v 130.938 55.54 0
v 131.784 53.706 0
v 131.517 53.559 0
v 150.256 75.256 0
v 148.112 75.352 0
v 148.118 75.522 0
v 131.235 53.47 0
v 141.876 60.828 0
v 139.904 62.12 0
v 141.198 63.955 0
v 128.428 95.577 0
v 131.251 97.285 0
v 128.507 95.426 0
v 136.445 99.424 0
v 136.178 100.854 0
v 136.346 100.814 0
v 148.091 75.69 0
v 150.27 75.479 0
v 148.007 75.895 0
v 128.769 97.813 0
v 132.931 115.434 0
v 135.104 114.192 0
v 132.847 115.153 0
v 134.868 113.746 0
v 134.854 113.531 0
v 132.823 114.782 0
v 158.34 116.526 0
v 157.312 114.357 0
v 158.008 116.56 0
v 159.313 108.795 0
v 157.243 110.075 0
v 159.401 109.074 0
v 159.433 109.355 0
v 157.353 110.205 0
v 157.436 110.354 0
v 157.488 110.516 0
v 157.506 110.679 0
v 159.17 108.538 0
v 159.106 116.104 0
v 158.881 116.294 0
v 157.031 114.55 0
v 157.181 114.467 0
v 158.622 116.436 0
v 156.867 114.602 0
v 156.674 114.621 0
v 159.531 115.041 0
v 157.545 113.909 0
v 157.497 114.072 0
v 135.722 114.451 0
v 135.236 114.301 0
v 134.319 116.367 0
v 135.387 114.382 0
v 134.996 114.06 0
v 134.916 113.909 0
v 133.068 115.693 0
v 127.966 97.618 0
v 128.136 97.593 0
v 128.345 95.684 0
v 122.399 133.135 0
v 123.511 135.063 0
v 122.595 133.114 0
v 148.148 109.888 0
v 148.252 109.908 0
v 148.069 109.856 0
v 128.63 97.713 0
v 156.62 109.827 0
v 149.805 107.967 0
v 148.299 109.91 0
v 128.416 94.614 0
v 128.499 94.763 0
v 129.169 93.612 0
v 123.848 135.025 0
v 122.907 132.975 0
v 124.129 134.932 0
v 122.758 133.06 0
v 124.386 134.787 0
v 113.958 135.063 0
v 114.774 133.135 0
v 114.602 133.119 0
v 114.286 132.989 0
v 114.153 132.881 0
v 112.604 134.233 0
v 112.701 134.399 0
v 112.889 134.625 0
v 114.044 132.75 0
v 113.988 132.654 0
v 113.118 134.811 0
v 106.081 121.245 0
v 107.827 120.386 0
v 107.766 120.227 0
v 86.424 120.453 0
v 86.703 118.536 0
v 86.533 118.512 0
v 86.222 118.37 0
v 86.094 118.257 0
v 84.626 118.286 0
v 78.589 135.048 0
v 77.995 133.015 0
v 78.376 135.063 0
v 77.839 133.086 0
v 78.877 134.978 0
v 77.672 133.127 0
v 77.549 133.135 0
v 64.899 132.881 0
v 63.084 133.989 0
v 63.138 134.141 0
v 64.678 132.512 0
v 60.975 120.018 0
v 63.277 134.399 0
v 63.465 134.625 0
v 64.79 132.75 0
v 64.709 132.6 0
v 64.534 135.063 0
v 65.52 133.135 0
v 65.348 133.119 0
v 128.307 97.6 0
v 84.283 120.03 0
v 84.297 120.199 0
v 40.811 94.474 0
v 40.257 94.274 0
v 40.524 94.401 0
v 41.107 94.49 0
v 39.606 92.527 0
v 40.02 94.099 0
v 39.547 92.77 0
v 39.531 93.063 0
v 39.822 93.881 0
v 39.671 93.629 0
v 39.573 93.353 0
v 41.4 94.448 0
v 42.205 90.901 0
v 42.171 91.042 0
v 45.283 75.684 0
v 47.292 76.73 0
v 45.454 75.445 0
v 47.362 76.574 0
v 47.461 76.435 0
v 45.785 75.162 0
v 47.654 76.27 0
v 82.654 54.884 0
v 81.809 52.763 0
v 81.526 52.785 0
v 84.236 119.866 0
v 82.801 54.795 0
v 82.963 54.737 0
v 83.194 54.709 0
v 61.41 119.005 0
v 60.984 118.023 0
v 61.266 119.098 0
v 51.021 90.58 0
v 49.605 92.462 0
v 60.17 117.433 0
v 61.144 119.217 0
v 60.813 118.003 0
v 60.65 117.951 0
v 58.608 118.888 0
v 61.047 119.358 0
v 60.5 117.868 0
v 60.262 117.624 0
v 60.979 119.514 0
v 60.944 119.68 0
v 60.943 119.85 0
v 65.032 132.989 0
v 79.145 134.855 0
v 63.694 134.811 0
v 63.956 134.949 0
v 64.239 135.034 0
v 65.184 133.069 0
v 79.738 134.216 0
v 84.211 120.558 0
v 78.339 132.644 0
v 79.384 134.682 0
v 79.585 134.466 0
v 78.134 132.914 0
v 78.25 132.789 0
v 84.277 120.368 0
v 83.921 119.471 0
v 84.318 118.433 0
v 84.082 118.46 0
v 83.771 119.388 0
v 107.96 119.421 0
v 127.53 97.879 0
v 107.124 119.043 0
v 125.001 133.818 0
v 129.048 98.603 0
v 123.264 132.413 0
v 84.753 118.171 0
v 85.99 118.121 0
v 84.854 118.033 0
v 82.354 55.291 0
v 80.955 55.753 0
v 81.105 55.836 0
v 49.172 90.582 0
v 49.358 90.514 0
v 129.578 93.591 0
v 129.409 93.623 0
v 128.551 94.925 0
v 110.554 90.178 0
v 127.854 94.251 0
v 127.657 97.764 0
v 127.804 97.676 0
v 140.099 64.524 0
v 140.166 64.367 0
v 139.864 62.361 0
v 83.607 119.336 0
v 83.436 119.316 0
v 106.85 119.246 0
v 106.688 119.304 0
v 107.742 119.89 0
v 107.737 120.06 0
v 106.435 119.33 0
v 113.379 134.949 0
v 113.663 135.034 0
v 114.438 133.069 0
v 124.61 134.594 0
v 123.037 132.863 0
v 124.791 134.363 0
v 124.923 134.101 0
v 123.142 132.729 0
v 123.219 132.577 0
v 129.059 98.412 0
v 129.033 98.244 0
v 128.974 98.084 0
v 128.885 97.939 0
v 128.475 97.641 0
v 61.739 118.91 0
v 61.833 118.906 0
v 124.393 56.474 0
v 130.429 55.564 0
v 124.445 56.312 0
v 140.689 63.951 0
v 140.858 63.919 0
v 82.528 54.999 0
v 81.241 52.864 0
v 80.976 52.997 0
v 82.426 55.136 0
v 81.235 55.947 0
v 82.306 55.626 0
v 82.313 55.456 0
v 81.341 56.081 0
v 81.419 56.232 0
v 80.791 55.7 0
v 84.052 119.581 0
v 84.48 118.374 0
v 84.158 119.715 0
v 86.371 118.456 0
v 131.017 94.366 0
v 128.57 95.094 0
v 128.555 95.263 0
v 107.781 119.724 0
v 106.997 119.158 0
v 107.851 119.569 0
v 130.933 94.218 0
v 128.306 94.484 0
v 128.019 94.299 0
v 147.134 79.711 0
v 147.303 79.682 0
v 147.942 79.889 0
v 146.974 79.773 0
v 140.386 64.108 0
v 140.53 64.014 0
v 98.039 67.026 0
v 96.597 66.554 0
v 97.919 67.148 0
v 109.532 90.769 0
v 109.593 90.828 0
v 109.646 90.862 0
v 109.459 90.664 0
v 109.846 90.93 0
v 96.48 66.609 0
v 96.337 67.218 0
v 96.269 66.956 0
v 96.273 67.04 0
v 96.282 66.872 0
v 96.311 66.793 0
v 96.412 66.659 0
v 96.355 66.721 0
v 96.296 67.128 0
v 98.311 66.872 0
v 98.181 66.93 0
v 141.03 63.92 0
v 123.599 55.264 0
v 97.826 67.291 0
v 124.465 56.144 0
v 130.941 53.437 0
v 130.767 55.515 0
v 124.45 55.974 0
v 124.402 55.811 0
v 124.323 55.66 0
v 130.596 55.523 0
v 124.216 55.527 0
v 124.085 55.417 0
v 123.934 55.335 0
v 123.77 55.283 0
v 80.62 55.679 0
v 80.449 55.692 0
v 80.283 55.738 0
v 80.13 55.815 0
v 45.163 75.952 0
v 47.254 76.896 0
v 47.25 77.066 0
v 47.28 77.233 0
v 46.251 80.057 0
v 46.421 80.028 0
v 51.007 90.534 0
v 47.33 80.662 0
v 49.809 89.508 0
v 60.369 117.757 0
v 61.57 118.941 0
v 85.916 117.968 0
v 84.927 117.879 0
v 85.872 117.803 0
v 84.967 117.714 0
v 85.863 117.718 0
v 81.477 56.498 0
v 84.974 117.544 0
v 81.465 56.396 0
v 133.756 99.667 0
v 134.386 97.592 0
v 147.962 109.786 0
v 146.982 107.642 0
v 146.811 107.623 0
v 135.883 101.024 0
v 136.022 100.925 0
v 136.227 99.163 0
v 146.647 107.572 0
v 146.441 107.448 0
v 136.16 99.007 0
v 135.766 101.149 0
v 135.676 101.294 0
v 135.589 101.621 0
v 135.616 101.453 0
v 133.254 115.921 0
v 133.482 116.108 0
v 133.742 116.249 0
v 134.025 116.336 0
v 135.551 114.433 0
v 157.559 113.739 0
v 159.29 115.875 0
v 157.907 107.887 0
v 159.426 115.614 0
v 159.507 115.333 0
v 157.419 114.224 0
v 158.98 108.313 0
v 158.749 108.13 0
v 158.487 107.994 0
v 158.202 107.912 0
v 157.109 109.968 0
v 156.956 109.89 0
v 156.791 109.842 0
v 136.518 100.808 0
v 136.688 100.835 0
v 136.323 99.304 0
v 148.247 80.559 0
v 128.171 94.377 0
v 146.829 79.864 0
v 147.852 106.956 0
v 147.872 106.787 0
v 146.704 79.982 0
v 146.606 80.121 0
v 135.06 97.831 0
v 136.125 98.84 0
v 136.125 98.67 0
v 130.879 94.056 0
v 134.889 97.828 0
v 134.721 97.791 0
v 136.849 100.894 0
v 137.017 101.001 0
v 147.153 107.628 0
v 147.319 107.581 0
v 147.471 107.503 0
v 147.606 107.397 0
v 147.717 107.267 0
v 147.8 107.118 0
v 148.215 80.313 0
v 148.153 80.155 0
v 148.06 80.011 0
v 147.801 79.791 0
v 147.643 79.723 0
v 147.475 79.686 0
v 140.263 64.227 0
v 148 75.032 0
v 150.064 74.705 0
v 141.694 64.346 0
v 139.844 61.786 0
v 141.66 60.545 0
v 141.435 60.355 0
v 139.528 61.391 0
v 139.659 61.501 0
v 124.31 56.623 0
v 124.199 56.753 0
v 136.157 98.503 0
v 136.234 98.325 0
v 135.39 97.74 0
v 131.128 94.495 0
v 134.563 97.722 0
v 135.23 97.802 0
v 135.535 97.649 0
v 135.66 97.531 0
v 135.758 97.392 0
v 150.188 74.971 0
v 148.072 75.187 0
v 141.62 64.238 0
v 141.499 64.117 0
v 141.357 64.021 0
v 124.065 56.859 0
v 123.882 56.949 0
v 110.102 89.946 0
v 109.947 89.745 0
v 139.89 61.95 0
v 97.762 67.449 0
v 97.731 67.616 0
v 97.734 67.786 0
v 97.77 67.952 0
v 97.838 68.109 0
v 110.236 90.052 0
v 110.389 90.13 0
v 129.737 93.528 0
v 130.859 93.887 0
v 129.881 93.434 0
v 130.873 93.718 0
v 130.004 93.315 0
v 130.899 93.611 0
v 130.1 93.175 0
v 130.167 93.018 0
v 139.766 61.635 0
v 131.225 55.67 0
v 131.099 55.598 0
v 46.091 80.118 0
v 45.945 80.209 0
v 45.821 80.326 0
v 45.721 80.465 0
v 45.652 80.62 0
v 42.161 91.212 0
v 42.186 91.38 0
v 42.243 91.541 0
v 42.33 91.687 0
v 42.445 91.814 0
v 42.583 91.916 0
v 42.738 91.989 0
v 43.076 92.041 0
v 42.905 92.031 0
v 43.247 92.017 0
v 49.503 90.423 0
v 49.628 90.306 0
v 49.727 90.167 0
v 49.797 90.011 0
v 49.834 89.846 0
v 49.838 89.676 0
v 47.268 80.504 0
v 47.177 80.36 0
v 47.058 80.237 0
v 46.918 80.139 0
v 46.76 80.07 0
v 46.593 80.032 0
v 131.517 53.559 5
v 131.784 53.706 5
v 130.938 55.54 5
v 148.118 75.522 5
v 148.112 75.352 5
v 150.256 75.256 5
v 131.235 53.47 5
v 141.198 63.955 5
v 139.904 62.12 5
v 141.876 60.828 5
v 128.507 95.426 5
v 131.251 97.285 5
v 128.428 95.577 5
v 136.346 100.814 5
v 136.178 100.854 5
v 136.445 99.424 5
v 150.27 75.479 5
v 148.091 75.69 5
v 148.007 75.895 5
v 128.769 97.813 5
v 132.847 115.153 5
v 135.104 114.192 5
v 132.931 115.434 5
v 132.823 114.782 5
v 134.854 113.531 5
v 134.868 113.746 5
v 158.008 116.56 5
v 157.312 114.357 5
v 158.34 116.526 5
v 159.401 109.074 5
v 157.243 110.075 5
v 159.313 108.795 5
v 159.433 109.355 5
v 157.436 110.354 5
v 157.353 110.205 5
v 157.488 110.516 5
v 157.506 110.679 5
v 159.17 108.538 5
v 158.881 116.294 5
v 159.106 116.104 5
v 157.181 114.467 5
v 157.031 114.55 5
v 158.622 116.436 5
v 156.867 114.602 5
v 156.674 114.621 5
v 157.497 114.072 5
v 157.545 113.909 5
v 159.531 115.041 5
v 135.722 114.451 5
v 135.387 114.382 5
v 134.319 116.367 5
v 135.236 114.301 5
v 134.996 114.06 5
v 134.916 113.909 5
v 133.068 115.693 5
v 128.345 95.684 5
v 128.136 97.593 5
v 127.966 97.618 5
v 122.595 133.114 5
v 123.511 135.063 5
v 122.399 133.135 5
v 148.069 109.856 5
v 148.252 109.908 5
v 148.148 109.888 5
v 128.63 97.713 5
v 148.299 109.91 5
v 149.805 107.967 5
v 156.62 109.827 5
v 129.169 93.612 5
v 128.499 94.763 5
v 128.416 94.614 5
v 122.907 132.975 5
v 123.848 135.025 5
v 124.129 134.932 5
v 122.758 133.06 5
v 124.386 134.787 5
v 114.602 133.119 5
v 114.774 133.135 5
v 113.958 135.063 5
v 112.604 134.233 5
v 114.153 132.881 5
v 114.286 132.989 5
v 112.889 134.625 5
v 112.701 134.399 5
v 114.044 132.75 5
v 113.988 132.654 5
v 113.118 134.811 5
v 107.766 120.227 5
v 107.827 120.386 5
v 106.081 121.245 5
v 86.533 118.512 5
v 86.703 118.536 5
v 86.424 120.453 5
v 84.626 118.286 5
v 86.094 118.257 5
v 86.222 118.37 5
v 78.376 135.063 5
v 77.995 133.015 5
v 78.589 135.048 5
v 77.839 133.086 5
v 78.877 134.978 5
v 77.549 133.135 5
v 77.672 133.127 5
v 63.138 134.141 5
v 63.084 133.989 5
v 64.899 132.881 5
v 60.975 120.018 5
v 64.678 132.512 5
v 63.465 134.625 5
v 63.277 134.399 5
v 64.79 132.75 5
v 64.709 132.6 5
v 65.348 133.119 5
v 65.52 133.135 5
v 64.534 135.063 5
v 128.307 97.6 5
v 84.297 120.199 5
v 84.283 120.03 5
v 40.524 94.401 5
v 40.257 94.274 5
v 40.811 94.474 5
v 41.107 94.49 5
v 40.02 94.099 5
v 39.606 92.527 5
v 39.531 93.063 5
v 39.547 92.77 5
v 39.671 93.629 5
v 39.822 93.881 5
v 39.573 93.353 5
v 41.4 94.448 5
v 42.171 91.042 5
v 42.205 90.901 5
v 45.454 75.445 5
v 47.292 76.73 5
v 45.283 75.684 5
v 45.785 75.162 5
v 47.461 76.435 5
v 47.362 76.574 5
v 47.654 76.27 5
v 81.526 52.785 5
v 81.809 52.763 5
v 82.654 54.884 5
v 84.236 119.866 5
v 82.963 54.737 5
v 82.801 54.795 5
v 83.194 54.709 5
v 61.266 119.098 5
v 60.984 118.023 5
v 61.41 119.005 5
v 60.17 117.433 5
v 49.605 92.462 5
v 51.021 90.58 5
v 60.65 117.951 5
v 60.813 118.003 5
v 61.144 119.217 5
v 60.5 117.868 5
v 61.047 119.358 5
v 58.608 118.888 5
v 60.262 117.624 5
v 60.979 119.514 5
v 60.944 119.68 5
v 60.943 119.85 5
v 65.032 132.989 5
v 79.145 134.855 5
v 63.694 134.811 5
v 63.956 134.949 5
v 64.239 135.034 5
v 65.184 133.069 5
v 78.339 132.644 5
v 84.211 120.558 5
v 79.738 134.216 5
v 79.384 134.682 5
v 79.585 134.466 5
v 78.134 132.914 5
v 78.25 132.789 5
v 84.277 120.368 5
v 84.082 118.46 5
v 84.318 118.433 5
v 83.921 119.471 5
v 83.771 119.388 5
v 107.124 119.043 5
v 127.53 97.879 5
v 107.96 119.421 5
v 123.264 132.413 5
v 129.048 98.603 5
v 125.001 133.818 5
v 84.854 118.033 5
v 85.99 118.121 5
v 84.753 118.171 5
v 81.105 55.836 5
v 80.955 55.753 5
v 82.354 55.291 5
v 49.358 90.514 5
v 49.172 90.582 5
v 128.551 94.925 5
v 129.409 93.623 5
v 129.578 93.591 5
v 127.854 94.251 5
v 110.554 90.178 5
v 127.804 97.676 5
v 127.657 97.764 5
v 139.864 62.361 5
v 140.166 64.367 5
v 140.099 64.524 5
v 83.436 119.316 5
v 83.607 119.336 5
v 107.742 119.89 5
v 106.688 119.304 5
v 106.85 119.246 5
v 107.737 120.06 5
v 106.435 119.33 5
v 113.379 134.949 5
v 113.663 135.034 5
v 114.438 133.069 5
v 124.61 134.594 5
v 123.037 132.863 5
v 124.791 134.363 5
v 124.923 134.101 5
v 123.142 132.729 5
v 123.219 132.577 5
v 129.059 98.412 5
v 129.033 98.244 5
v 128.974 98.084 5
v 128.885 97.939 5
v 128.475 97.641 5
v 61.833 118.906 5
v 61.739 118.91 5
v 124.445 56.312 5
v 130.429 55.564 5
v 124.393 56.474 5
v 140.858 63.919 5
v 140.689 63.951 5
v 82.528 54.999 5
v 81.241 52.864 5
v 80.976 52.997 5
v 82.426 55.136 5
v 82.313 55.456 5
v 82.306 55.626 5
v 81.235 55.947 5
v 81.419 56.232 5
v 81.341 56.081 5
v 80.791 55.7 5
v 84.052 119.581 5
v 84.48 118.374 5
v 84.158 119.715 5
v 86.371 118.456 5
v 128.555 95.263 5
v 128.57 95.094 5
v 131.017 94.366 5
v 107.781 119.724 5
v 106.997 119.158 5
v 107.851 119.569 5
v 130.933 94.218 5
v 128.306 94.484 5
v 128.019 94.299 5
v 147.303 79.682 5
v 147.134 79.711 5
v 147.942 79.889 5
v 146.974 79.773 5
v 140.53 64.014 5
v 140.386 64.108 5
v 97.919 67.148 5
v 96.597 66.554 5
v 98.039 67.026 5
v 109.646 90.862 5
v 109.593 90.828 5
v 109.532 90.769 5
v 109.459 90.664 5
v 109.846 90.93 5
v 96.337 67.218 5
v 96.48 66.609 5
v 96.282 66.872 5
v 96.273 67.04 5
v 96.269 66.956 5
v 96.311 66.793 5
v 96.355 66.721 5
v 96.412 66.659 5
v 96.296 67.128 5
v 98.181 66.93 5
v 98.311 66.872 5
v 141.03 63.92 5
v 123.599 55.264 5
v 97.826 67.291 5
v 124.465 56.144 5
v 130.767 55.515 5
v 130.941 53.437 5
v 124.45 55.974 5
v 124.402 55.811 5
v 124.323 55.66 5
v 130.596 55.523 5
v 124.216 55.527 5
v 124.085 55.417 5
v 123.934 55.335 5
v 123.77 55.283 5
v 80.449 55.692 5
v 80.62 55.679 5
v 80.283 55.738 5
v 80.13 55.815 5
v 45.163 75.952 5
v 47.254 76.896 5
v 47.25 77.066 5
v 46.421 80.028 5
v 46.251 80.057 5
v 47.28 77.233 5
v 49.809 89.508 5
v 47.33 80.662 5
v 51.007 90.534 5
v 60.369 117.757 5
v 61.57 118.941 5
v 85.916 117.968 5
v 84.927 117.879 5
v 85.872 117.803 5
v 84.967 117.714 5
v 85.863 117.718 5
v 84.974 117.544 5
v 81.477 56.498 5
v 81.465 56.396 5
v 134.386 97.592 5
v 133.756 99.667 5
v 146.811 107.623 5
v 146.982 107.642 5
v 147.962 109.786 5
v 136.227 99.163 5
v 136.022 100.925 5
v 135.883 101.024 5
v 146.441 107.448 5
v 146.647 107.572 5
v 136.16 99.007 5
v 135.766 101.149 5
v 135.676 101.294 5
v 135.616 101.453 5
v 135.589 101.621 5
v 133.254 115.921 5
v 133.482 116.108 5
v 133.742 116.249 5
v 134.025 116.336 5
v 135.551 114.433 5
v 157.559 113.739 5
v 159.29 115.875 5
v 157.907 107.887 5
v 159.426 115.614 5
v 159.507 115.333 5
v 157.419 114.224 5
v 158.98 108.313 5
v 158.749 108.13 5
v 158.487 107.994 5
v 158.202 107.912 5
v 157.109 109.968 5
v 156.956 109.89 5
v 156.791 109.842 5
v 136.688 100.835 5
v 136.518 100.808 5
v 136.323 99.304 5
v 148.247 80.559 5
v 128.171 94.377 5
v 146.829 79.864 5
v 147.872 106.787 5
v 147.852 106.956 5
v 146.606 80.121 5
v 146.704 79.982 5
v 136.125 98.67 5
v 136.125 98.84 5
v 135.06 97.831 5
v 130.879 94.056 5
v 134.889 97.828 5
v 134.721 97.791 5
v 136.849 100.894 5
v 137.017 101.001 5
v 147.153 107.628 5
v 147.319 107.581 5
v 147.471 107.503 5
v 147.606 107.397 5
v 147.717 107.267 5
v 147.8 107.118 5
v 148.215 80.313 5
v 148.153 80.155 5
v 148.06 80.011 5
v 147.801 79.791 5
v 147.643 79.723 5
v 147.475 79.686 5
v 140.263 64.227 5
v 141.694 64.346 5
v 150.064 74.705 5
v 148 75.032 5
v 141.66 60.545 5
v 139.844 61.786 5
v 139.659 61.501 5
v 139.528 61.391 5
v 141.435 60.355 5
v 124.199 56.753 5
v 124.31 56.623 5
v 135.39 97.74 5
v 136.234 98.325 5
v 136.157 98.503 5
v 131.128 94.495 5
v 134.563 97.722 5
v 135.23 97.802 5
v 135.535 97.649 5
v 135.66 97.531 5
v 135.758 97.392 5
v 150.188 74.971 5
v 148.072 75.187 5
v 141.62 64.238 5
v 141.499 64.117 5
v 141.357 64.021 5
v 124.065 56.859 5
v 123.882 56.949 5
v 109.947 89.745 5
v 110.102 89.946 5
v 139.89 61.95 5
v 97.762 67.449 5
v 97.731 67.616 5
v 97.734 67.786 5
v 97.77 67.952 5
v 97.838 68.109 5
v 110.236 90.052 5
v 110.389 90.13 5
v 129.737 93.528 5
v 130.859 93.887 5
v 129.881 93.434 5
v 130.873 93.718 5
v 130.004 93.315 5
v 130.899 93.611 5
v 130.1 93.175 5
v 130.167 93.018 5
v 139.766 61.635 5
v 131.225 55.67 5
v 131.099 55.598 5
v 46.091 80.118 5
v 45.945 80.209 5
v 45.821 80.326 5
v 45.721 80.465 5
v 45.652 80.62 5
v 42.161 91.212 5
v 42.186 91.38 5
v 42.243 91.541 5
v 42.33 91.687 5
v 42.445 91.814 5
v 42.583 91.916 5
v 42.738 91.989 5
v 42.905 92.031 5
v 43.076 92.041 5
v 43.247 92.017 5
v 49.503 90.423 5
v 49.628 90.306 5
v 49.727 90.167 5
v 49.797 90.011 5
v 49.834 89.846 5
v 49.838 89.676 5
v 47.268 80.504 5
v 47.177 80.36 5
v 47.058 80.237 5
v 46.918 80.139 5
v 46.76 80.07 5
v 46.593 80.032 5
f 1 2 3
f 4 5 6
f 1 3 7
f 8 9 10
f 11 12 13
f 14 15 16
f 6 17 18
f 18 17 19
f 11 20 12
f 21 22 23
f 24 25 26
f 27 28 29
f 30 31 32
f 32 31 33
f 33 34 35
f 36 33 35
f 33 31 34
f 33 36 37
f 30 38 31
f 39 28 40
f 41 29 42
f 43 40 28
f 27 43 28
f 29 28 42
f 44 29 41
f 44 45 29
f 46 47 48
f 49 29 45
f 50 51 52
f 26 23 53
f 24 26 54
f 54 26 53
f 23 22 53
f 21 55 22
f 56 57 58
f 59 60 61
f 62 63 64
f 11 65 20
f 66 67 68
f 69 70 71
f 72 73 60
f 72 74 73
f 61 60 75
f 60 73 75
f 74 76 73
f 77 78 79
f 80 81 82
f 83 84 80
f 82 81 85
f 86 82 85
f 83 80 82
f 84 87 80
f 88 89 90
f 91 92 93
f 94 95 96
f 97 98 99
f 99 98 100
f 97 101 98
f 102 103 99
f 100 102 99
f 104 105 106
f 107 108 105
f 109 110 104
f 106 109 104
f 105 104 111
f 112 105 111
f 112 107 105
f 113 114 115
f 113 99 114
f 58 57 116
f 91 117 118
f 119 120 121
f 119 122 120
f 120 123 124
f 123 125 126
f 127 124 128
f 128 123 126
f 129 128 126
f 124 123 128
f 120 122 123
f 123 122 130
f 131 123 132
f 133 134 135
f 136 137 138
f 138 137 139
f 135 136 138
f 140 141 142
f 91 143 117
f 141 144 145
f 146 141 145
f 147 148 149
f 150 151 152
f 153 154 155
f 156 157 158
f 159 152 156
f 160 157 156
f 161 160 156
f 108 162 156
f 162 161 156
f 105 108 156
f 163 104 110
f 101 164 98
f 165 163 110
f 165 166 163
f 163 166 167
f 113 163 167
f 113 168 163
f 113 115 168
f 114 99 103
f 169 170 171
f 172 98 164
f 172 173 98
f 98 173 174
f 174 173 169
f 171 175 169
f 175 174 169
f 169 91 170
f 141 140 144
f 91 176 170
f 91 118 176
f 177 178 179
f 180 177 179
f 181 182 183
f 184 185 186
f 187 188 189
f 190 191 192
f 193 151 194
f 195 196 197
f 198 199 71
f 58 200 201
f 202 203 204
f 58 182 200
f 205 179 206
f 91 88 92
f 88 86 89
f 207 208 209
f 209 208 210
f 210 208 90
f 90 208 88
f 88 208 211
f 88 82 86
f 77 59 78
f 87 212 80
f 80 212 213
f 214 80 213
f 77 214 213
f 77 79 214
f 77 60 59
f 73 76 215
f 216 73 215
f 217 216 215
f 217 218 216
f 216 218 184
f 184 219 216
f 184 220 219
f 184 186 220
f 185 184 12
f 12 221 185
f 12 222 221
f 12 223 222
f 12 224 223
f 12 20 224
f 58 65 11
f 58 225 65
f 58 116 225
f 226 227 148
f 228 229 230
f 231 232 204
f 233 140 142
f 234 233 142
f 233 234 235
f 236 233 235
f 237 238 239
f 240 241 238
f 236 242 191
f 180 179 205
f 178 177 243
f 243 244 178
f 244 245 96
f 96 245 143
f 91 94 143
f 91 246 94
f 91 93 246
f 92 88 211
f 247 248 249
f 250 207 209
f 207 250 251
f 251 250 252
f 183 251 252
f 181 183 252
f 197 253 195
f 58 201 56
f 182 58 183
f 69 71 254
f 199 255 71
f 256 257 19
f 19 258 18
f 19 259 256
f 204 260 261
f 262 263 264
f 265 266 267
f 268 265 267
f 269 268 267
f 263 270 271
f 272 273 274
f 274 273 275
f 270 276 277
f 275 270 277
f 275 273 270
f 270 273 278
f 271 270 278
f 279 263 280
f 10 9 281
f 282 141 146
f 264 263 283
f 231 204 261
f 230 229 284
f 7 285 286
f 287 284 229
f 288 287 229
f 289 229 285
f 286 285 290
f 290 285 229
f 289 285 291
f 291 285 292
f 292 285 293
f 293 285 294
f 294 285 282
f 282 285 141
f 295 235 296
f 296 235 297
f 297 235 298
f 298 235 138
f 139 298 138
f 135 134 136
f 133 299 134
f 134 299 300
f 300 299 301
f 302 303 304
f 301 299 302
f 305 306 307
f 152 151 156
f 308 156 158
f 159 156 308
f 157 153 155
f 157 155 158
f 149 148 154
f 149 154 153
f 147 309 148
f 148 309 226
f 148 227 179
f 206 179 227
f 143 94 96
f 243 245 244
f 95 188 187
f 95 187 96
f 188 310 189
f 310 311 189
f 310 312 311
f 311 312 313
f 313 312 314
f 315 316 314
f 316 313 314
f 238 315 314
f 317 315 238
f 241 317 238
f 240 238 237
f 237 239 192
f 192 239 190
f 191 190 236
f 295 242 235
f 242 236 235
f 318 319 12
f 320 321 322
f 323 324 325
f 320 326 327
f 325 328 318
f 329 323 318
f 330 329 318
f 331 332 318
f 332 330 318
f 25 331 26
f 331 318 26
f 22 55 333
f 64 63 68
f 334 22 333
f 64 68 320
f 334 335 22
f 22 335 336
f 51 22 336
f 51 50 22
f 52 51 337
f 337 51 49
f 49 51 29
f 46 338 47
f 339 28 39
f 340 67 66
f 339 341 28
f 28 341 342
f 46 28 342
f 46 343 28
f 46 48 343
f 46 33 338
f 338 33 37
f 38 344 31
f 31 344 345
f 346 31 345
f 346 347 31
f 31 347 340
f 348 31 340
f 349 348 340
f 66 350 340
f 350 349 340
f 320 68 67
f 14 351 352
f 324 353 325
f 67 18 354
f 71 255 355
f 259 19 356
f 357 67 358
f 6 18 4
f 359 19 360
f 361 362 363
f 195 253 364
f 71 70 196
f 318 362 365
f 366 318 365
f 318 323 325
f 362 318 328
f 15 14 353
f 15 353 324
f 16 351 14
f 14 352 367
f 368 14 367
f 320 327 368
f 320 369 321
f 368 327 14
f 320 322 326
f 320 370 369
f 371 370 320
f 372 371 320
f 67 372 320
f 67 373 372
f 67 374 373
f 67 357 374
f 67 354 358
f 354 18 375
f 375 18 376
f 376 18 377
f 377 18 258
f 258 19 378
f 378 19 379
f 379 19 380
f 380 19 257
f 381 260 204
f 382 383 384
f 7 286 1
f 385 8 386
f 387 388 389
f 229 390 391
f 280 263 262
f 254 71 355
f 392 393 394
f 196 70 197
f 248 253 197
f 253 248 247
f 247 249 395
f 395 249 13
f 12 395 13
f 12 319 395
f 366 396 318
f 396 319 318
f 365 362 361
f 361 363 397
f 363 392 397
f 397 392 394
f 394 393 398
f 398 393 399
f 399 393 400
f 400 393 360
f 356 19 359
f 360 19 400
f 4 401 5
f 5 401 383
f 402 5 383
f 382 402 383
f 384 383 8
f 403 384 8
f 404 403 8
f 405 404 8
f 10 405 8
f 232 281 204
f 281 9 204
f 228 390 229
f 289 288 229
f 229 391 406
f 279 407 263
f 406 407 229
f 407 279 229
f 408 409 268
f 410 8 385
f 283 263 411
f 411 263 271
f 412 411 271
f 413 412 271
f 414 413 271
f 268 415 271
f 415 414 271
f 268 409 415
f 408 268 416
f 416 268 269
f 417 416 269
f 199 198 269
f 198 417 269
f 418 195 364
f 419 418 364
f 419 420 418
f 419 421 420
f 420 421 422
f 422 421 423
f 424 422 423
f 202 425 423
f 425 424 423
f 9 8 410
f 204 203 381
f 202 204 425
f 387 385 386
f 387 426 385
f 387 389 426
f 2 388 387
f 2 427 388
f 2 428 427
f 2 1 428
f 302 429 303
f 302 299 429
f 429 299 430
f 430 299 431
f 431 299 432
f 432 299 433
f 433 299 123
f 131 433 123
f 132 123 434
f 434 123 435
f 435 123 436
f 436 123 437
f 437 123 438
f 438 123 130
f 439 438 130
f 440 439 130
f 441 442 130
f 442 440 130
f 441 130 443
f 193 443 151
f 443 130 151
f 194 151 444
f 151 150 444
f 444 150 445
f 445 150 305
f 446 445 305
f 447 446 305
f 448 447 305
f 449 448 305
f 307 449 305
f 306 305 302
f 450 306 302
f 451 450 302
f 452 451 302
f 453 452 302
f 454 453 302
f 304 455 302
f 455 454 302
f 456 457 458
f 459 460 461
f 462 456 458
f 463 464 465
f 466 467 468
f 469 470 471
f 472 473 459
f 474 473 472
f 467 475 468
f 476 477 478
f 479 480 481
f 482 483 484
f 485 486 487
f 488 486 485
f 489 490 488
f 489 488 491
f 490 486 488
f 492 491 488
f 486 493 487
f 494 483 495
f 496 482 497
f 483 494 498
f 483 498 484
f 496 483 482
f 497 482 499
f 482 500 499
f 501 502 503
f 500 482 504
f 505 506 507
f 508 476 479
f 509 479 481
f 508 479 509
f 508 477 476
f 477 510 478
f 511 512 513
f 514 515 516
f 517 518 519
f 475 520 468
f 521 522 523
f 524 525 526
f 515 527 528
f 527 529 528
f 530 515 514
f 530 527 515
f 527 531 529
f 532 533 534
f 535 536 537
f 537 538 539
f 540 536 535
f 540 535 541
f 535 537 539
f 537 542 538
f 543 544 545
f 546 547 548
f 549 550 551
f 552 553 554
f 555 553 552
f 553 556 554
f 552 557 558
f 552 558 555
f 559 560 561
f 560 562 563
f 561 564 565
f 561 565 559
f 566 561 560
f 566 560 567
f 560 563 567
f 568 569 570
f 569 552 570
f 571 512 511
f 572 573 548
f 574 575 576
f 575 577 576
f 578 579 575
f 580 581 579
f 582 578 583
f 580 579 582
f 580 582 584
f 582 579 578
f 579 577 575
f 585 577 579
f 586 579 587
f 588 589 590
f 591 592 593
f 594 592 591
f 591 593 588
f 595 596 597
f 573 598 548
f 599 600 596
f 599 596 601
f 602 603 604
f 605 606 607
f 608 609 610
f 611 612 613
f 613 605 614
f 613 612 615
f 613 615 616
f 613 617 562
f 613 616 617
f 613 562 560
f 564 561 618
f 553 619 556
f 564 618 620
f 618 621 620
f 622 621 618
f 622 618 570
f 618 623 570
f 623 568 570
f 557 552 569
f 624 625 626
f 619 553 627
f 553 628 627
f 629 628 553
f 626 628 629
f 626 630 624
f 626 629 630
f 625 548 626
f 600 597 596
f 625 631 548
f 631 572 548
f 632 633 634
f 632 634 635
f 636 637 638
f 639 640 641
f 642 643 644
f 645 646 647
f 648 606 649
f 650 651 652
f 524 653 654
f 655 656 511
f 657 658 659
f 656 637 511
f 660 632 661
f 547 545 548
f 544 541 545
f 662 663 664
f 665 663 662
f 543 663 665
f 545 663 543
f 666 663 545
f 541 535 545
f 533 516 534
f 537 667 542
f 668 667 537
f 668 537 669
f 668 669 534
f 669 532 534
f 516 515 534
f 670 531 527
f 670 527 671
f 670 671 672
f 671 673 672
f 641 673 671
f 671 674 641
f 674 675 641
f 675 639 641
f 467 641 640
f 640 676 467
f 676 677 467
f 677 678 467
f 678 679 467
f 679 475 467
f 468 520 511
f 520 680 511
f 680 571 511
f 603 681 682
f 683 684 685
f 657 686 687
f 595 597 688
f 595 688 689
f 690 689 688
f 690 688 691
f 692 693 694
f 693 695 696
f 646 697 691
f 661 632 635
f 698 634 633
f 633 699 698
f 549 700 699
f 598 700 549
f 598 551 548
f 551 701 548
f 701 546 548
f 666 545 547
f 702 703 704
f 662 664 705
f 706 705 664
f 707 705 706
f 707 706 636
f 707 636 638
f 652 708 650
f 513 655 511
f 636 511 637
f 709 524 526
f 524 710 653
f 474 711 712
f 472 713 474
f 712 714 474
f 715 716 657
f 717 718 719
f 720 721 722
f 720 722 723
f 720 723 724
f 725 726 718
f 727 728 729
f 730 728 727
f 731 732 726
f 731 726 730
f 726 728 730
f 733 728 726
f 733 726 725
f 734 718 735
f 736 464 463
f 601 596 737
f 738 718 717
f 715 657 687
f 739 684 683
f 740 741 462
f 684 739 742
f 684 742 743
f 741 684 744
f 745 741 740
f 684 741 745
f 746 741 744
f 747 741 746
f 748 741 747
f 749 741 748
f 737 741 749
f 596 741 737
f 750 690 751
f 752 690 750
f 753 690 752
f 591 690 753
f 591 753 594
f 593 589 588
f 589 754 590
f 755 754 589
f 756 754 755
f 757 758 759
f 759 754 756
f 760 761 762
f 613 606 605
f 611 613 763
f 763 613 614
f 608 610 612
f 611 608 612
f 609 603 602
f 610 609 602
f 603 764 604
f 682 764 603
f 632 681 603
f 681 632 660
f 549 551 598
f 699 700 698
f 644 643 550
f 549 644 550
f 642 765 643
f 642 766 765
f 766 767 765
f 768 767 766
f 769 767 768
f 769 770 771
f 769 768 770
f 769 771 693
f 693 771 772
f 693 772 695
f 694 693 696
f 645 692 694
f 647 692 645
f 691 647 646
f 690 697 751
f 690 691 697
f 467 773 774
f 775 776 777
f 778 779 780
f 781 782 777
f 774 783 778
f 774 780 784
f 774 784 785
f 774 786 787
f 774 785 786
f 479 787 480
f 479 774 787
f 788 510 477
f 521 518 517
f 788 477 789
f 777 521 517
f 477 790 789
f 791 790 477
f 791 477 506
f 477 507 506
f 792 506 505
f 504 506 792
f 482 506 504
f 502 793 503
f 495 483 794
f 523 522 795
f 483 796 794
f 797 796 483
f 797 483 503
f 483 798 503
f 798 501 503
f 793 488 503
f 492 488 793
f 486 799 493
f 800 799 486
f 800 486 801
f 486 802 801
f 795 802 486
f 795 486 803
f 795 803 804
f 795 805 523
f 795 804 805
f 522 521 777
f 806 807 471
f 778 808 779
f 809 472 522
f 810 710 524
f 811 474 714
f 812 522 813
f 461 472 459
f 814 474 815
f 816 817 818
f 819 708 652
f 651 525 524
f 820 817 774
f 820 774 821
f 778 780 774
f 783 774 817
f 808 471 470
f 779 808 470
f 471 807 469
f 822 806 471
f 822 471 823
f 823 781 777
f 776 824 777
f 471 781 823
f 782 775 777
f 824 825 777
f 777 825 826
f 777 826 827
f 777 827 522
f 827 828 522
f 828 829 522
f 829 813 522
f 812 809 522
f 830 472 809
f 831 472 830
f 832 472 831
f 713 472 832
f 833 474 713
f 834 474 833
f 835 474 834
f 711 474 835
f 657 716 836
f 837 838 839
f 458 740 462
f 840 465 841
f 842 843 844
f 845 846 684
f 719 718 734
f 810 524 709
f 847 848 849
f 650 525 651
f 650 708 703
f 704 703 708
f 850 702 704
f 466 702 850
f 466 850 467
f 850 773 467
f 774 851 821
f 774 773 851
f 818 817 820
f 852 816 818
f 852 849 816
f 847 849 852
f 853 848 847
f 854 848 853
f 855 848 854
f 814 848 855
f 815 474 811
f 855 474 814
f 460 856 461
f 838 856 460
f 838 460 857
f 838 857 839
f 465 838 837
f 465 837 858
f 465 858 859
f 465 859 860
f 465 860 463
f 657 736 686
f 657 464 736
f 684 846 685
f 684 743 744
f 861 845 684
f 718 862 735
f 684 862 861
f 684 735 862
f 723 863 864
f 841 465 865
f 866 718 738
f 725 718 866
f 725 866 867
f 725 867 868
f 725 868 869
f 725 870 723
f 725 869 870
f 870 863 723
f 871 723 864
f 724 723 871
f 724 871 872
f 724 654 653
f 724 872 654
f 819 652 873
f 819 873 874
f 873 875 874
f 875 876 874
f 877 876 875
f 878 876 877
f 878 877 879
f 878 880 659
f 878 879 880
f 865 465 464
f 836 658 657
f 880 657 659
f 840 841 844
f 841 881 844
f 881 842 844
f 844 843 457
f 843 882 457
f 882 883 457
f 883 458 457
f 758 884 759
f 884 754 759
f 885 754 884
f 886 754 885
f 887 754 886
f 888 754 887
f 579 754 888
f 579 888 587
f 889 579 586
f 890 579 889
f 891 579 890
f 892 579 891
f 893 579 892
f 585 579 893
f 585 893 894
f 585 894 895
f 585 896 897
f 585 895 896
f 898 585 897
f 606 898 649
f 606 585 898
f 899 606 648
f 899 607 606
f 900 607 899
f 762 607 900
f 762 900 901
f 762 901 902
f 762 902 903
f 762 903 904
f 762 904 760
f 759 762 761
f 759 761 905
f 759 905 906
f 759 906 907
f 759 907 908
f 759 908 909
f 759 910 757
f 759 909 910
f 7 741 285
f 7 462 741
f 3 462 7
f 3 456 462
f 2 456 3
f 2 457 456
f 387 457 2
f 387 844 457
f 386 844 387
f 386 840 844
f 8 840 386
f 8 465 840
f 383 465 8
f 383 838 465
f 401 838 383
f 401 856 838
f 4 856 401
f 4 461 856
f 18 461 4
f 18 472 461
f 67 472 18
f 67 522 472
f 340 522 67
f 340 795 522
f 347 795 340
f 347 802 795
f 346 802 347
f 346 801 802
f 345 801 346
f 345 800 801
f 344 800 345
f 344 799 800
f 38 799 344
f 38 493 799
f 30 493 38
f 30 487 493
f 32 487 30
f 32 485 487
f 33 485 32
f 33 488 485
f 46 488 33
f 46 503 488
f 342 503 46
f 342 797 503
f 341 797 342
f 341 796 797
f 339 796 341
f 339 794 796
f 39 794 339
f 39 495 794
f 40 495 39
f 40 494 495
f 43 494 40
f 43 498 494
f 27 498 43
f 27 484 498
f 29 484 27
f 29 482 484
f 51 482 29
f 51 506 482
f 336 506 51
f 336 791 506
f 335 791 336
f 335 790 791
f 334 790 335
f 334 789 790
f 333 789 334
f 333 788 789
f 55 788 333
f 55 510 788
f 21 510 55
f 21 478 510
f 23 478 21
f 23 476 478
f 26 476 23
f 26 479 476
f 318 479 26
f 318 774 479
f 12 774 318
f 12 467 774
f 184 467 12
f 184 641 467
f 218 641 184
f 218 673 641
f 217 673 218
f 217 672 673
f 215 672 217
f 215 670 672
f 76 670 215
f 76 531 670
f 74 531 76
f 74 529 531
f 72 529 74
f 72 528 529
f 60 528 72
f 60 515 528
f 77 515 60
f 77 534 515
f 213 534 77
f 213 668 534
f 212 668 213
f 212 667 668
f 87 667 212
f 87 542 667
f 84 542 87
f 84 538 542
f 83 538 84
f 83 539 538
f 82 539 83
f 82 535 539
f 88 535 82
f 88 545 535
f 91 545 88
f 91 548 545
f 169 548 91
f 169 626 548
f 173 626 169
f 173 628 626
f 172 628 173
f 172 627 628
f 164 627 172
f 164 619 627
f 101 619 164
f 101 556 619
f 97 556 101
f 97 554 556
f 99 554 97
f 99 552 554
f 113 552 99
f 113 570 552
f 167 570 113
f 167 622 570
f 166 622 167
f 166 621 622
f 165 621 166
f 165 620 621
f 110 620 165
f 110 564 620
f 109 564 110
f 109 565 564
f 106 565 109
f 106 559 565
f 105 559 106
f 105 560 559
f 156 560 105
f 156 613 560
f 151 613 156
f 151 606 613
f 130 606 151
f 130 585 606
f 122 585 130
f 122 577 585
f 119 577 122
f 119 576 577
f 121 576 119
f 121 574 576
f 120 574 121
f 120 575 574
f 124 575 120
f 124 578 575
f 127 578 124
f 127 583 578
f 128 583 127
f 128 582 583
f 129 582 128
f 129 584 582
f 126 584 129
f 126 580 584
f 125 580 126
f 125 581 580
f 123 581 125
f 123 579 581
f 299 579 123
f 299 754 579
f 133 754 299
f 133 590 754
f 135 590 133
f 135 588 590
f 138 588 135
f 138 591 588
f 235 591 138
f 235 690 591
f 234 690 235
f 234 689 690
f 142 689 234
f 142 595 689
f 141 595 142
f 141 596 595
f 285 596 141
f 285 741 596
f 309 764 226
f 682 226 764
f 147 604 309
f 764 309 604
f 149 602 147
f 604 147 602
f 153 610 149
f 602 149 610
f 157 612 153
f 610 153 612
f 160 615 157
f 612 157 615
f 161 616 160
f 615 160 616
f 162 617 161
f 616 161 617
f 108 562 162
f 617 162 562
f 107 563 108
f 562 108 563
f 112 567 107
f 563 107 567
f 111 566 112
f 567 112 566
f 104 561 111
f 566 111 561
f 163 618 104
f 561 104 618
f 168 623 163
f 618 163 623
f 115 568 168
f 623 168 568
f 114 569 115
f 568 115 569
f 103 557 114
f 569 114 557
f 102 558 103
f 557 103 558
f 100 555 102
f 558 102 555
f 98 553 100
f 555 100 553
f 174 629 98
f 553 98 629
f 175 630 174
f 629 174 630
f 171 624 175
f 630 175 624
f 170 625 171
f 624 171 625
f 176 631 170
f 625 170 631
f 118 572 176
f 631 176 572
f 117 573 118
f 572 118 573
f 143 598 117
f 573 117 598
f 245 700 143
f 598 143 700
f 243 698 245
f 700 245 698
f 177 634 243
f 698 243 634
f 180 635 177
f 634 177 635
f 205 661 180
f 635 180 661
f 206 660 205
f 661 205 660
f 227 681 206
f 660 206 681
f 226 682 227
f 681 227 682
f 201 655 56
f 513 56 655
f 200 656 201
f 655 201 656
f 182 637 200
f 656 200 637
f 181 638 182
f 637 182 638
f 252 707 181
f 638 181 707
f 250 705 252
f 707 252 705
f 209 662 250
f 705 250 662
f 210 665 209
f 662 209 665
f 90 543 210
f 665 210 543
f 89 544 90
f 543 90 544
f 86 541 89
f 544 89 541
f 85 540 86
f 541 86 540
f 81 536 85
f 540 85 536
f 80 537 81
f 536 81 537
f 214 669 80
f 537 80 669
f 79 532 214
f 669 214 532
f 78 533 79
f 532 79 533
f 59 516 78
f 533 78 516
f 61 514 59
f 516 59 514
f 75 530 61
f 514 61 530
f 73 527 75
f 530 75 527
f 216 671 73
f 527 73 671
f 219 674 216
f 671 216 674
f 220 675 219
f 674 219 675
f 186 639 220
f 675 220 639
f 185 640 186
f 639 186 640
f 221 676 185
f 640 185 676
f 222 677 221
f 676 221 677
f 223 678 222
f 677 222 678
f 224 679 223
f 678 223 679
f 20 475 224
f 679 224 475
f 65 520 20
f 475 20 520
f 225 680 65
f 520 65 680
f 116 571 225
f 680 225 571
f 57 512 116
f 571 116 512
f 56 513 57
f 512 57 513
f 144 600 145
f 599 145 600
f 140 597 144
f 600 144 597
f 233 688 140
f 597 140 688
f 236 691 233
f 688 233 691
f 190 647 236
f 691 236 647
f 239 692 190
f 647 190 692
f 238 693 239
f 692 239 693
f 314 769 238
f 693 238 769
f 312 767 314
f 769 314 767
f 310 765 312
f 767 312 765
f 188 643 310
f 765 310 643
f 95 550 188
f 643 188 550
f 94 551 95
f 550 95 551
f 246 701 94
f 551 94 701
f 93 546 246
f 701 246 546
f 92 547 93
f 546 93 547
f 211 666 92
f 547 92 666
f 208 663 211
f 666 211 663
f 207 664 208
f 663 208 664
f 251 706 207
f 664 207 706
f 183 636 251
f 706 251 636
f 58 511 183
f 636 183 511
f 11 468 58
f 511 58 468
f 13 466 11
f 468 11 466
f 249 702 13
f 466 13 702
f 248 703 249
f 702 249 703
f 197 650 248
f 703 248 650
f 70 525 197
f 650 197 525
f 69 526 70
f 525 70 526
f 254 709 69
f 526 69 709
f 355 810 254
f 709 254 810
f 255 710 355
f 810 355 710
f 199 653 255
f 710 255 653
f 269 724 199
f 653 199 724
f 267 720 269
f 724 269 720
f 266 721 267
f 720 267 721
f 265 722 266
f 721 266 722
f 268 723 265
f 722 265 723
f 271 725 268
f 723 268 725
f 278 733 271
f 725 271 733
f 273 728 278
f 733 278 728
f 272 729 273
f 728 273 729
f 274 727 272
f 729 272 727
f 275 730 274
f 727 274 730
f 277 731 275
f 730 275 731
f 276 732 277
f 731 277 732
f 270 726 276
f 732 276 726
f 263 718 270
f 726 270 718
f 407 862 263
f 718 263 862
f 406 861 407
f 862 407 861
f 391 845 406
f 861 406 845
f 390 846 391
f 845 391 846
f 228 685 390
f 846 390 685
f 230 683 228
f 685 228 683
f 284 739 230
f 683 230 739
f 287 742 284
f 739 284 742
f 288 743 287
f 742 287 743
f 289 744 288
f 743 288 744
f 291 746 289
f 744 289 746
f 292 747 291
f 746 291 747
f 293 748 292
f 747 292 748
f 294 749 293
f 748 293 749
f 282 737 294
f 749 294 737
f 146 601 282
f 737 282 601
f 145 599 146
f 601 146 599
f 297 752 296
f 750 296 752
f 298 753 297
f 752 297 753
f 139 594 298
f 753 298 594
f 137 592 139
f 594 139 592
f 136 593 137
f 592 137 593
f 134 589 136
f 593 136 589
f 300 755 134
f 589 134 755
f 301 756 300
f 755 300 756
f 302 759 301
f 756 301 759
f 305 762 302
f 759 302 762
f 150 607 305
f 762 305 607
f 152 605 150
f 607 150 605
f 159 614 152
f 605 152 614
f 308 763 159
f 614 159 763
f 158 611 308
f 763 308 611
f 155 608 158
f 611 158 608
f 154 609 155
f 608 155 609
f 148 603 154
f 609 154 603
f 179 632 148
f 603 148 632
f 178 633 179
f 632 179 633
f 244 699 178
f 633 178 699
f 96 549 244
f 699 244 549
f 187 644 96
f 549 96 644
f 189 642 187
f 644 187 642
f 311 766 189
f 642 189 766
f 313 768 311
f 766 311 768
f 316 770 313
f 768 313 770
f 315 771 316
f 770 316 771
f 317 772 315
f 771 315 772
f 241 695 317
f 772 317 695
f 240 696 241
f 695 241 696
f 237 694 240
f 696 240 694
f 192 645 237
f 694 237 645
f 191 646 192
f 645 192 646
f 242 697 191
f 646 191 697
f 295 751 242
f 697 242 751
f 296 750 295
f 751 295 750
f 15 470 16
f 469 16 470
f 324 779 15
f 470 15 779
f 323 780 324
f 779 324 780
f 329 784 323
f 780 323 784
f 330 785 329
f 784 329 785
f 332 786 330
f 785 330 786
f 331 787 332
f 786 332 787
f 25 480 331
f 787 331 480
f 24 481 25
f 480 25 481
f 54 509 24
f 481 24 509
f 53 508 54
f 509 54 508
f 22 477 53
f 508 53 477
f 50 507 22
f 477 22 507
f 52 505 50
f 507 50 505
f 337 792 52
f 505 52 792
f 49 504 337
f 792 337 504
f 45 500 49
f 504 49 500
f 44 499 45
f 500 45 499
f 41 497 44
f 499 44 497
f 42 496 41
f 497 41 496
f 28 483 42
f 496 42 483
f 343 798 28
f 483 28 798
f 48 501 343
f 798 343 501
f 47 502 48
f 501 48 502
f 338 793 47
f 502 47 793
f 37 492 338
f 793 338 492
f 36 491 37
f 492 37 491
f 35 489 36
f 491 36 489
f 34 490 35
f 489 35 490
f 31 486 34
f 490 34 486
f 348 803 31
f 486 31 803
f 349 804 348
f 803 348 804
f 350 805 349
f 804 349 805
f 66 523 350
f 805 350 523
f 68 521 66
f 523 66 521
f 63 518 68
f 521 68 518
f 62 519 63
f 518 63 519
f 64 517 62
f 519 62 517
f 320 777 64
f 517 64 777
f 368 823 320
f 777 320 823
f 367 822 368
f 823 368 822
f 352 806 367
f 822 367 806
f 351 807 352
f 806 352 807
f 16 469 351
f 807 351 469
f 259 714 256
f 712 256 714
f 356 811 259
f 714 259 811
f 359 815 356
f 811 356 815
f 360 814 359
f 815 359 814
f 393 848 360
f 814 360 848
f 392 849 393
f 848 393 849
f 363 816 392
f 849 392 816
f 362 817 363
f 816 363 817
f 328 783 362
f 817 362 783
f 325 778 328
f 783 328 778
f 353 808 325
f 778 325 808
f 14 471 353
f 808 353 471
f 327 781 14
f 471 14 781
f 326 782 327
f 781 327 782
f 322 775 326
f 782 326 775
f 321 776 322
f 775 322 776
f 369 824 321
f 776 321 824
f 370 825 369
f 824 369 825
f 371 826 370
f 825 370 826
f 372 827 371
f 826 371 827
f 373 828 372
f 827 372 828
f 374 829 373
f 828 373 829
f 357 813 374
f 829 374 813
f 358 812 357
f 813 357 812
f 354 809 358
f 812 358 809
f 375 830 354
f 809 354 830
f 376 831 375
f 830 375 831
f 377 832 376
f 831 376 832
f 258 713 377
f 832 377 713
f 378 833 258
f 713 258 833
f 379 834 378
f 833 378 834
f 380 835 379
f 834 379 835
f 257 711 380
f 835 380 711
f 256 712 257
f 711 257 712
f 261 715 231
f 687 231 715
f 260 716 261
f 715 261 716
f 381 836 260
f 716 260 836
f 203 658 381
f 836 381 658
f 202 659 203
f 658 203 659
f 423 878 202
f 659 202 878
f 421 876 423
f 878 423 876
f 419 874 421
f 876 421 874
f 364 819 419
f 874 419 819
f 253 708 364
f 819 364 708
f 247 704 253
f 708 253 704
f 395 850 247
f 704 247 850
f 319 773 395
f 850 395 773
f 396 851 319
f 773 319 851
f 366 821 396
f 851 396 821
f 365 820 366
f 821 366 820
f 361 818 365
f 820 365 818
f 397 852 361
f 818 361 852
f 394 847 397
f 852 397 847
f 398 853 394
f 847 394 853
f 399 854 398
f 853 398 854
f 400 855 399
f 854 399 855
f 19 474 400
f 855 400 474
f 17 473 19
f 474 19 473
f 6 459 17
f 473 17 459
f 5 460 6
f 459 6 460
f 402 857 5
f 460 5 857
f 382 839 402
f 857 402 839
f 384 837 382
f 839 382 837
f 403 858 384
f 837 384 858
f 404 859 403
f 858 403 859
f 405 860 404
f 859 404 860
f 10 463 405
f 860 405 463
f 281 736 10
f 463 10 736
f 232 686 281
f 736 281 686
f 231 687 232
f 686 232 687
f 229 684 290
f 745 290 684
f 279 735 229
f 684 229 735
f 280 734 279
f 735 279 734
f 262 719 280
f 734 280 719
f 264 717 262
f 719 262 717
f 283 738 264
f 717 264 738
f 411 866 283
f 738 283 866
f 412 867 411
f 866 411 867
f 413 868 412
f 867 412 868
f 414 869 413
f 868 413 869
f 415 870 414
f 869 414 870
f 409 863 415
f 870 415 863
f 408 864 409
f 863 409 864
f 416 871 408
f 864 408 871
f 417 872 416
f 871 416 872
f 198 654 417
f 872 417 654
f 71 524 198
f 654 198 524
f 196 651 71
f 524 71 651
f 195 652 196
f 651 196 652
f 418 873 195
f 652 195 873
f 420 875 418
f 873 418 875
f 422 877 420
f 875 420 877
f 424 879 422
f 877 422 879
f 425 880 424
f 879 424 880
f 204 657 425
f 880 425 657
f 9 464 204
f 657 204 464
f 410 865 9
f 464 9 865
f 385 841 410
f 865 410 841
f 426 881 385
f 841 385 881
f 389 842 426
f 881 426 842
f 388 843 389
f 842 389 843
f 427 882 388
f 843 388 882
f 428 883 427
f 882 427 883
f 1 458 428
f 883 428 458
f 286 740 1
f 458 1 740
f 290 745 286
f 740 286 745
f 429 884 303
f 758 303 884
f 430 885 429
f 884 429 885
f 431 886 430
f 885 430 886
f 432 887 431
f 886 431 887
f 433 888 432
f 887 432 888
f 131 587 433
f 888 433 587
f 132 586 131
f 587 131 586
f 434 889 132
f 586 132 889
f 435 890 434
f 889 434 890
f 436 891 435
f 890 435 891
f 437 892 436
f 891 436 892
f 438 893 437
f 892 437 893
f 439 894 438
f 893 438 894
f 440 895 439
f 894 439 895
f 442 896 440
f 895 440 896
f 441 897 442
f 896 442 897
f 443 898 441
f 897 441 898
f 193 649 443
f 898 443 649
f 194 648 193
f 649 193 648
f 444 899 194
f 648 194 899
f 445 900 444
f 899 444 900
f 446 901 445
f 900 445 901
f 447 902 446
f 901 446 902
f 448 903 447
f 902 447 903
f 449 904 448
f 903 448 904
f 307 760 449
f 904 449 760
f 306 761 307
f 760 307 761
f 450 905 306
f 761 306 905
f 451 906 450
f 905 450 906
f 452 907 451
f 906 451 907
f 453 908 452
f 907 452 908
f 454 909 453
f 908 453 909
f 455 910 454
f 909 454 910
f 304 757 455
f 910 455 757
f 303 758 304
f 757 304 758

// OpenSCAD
/*
 * Customizable Origami - Elephant No. 2 - https://www.thingiverse.com/thing:2669551
 * by Dennis Hofmann - https://www.thingiverse.com/mightynozzle/about
 * created 2017-11-26
 * version v1.0
 *
 * Changelog
 * --------------
 * v1.0:
 *      - final design
 * --------------
 * 
 * This work is licensed under the Creative Commons - Attribution - NonCommercial - ShareAlike license.
 * https://creativecommons.org/licenses/by-nc-sa/3.0/
 */


 // Parameter Section //
//-------------------//

// preview[view:north, tilt:top]

// The maximum size of the longest side. The shorter side will be automatically resized in same ratio.
max_size_in_millimeter = 120; //[20:300]

// The height of the model.
model_height_in_millimeter = 5; //[0.2:0.2:100]

// Thickness of the outer outline.
outline_size_in_millimeter = 2.0; //[0.5:0.1:20]

// Thickness of the inner outline.
inline_size_in_millimeter = 0.9; //[0.5:0.1:20]

// Roundiness of the ends of the inner outlines.
inline_edge_radius_in_millimeter = 0.9; //[0.0:0.1:5]

// Flip model
flip_model = "no"; //[yes,no]

/*[hidden]*/
max_size = max_size_in_millimeter;
model_height = model_height_in_millimeter;
$fn=32;

// Outer Points
A1 = [421, 965];
A2 = [478, 793];
A3 = [839, 563];
A4 = [1343, 570];
A5 = [1442, 639];
A6 = [1526, 783];
A7 = [1521, 1136];
A8 = [1620, 1135];
A9 = [1621, 1194];
A10 = [1378, 1192];
A11 = [1388, 1028];
A12 = [1336, 978];
A13 = [1267, 1386];
A14 = [1169, 1386];
A15 = [1098, 1243];
A16 = [877, 1234];
A17 = [804, 1386];
A18 = [662, 1386];
A19 = [616, 1229];
A20 = [519, 941];

outline = [A1, A2, A3, A4, A5, A6, A7, A8, A9, A10, A11, A12, A13, A14, A15, A16, A17, A18, A19, A20];

// Inner Points
B1 = [992, 695];
B2 = [1127, 939];

// Polygons
C1 = [A1, A20, A2];
C2 = [A20, A2, A3, A16, A19];
C3 = [A19, A16, A17, A18];
C4 = [A3, A4, B1, B2, A12, A15, A16];
C5 = [A12, A13, A14, A15];
C6 = [B1, A4, A5, A12, B2];
C7 = [A5, A6, A11, A12];
C8 = [A6, A7, A11];
C9 = [A11, A7, A8, A9, A10];

cut_polygons = [C1, C2, C3, C4, C5, C6, C7, C8, C9];

min_x = A1[0];
min_y = A3[1];
max_x = A9[0];
max_y = A13[1];

x_size = max_x - min_x;
y_size = max_y - min_y;

x_factor = max_size / x_size;
y_factor = max_size / y_size;

inline_size = x_size > y_size ? inline_size_in_millimeter / x_factor / 2: inline_size_in_millimeter / y_factor / 2;
inline_edge_radius = x_size > y_size ? inline_edge_radius_in_millimeter / x_factor: inline_edge_radius_in_millimeter / y_factor;
outline_size = x_size > y_size ? outline_size_in_millimeter / x_factor - inline_size: outline_size_in_millimeter / y_factor - inline_size;


 // Program Section //
//-----------------//

if(x_size > y_size) {
    resize(newsize=[max_size, x_factor * y_size, model_height]){
        if(flip_model == "yes") {
            mirror([0,1,0]) {
                rotate([180,180,0]) {    
                    create(outline, cut_polygons);
                }
            }
        } else {
            create(outline, cut_polygons);
        }
    }
} else {
    resize(newsize=[y_factor * x_size, max_size, model_height]){
        if(flip_model == "yes") {
            mirror([0,1,0]) {
                rotate([180,180,0]) {    
                    create(outline, cut_polygons);
                }
            }
        } else {
            create(outline, cut_polygons);
        }
    }
}


 // Module Section //
//----------------//

module create() {
    linear_extrude(height=1) {
        difference() {
            offset(r = -0) {
                offset(r = +outline_size) {
                    polygon(points = outline, convexity = 10);
                }
            }
            
            for(cut_polygon = [0:len(cut_polygons)]) {
                offset(r = +inline_edge_radius) {
                    offset(r = -inline_size - inline_edge_radius) {
                        polygon(points = cut_polygons[cut_polygon], convexity = 10);
                    }
                }
            }
        }
    }
}
